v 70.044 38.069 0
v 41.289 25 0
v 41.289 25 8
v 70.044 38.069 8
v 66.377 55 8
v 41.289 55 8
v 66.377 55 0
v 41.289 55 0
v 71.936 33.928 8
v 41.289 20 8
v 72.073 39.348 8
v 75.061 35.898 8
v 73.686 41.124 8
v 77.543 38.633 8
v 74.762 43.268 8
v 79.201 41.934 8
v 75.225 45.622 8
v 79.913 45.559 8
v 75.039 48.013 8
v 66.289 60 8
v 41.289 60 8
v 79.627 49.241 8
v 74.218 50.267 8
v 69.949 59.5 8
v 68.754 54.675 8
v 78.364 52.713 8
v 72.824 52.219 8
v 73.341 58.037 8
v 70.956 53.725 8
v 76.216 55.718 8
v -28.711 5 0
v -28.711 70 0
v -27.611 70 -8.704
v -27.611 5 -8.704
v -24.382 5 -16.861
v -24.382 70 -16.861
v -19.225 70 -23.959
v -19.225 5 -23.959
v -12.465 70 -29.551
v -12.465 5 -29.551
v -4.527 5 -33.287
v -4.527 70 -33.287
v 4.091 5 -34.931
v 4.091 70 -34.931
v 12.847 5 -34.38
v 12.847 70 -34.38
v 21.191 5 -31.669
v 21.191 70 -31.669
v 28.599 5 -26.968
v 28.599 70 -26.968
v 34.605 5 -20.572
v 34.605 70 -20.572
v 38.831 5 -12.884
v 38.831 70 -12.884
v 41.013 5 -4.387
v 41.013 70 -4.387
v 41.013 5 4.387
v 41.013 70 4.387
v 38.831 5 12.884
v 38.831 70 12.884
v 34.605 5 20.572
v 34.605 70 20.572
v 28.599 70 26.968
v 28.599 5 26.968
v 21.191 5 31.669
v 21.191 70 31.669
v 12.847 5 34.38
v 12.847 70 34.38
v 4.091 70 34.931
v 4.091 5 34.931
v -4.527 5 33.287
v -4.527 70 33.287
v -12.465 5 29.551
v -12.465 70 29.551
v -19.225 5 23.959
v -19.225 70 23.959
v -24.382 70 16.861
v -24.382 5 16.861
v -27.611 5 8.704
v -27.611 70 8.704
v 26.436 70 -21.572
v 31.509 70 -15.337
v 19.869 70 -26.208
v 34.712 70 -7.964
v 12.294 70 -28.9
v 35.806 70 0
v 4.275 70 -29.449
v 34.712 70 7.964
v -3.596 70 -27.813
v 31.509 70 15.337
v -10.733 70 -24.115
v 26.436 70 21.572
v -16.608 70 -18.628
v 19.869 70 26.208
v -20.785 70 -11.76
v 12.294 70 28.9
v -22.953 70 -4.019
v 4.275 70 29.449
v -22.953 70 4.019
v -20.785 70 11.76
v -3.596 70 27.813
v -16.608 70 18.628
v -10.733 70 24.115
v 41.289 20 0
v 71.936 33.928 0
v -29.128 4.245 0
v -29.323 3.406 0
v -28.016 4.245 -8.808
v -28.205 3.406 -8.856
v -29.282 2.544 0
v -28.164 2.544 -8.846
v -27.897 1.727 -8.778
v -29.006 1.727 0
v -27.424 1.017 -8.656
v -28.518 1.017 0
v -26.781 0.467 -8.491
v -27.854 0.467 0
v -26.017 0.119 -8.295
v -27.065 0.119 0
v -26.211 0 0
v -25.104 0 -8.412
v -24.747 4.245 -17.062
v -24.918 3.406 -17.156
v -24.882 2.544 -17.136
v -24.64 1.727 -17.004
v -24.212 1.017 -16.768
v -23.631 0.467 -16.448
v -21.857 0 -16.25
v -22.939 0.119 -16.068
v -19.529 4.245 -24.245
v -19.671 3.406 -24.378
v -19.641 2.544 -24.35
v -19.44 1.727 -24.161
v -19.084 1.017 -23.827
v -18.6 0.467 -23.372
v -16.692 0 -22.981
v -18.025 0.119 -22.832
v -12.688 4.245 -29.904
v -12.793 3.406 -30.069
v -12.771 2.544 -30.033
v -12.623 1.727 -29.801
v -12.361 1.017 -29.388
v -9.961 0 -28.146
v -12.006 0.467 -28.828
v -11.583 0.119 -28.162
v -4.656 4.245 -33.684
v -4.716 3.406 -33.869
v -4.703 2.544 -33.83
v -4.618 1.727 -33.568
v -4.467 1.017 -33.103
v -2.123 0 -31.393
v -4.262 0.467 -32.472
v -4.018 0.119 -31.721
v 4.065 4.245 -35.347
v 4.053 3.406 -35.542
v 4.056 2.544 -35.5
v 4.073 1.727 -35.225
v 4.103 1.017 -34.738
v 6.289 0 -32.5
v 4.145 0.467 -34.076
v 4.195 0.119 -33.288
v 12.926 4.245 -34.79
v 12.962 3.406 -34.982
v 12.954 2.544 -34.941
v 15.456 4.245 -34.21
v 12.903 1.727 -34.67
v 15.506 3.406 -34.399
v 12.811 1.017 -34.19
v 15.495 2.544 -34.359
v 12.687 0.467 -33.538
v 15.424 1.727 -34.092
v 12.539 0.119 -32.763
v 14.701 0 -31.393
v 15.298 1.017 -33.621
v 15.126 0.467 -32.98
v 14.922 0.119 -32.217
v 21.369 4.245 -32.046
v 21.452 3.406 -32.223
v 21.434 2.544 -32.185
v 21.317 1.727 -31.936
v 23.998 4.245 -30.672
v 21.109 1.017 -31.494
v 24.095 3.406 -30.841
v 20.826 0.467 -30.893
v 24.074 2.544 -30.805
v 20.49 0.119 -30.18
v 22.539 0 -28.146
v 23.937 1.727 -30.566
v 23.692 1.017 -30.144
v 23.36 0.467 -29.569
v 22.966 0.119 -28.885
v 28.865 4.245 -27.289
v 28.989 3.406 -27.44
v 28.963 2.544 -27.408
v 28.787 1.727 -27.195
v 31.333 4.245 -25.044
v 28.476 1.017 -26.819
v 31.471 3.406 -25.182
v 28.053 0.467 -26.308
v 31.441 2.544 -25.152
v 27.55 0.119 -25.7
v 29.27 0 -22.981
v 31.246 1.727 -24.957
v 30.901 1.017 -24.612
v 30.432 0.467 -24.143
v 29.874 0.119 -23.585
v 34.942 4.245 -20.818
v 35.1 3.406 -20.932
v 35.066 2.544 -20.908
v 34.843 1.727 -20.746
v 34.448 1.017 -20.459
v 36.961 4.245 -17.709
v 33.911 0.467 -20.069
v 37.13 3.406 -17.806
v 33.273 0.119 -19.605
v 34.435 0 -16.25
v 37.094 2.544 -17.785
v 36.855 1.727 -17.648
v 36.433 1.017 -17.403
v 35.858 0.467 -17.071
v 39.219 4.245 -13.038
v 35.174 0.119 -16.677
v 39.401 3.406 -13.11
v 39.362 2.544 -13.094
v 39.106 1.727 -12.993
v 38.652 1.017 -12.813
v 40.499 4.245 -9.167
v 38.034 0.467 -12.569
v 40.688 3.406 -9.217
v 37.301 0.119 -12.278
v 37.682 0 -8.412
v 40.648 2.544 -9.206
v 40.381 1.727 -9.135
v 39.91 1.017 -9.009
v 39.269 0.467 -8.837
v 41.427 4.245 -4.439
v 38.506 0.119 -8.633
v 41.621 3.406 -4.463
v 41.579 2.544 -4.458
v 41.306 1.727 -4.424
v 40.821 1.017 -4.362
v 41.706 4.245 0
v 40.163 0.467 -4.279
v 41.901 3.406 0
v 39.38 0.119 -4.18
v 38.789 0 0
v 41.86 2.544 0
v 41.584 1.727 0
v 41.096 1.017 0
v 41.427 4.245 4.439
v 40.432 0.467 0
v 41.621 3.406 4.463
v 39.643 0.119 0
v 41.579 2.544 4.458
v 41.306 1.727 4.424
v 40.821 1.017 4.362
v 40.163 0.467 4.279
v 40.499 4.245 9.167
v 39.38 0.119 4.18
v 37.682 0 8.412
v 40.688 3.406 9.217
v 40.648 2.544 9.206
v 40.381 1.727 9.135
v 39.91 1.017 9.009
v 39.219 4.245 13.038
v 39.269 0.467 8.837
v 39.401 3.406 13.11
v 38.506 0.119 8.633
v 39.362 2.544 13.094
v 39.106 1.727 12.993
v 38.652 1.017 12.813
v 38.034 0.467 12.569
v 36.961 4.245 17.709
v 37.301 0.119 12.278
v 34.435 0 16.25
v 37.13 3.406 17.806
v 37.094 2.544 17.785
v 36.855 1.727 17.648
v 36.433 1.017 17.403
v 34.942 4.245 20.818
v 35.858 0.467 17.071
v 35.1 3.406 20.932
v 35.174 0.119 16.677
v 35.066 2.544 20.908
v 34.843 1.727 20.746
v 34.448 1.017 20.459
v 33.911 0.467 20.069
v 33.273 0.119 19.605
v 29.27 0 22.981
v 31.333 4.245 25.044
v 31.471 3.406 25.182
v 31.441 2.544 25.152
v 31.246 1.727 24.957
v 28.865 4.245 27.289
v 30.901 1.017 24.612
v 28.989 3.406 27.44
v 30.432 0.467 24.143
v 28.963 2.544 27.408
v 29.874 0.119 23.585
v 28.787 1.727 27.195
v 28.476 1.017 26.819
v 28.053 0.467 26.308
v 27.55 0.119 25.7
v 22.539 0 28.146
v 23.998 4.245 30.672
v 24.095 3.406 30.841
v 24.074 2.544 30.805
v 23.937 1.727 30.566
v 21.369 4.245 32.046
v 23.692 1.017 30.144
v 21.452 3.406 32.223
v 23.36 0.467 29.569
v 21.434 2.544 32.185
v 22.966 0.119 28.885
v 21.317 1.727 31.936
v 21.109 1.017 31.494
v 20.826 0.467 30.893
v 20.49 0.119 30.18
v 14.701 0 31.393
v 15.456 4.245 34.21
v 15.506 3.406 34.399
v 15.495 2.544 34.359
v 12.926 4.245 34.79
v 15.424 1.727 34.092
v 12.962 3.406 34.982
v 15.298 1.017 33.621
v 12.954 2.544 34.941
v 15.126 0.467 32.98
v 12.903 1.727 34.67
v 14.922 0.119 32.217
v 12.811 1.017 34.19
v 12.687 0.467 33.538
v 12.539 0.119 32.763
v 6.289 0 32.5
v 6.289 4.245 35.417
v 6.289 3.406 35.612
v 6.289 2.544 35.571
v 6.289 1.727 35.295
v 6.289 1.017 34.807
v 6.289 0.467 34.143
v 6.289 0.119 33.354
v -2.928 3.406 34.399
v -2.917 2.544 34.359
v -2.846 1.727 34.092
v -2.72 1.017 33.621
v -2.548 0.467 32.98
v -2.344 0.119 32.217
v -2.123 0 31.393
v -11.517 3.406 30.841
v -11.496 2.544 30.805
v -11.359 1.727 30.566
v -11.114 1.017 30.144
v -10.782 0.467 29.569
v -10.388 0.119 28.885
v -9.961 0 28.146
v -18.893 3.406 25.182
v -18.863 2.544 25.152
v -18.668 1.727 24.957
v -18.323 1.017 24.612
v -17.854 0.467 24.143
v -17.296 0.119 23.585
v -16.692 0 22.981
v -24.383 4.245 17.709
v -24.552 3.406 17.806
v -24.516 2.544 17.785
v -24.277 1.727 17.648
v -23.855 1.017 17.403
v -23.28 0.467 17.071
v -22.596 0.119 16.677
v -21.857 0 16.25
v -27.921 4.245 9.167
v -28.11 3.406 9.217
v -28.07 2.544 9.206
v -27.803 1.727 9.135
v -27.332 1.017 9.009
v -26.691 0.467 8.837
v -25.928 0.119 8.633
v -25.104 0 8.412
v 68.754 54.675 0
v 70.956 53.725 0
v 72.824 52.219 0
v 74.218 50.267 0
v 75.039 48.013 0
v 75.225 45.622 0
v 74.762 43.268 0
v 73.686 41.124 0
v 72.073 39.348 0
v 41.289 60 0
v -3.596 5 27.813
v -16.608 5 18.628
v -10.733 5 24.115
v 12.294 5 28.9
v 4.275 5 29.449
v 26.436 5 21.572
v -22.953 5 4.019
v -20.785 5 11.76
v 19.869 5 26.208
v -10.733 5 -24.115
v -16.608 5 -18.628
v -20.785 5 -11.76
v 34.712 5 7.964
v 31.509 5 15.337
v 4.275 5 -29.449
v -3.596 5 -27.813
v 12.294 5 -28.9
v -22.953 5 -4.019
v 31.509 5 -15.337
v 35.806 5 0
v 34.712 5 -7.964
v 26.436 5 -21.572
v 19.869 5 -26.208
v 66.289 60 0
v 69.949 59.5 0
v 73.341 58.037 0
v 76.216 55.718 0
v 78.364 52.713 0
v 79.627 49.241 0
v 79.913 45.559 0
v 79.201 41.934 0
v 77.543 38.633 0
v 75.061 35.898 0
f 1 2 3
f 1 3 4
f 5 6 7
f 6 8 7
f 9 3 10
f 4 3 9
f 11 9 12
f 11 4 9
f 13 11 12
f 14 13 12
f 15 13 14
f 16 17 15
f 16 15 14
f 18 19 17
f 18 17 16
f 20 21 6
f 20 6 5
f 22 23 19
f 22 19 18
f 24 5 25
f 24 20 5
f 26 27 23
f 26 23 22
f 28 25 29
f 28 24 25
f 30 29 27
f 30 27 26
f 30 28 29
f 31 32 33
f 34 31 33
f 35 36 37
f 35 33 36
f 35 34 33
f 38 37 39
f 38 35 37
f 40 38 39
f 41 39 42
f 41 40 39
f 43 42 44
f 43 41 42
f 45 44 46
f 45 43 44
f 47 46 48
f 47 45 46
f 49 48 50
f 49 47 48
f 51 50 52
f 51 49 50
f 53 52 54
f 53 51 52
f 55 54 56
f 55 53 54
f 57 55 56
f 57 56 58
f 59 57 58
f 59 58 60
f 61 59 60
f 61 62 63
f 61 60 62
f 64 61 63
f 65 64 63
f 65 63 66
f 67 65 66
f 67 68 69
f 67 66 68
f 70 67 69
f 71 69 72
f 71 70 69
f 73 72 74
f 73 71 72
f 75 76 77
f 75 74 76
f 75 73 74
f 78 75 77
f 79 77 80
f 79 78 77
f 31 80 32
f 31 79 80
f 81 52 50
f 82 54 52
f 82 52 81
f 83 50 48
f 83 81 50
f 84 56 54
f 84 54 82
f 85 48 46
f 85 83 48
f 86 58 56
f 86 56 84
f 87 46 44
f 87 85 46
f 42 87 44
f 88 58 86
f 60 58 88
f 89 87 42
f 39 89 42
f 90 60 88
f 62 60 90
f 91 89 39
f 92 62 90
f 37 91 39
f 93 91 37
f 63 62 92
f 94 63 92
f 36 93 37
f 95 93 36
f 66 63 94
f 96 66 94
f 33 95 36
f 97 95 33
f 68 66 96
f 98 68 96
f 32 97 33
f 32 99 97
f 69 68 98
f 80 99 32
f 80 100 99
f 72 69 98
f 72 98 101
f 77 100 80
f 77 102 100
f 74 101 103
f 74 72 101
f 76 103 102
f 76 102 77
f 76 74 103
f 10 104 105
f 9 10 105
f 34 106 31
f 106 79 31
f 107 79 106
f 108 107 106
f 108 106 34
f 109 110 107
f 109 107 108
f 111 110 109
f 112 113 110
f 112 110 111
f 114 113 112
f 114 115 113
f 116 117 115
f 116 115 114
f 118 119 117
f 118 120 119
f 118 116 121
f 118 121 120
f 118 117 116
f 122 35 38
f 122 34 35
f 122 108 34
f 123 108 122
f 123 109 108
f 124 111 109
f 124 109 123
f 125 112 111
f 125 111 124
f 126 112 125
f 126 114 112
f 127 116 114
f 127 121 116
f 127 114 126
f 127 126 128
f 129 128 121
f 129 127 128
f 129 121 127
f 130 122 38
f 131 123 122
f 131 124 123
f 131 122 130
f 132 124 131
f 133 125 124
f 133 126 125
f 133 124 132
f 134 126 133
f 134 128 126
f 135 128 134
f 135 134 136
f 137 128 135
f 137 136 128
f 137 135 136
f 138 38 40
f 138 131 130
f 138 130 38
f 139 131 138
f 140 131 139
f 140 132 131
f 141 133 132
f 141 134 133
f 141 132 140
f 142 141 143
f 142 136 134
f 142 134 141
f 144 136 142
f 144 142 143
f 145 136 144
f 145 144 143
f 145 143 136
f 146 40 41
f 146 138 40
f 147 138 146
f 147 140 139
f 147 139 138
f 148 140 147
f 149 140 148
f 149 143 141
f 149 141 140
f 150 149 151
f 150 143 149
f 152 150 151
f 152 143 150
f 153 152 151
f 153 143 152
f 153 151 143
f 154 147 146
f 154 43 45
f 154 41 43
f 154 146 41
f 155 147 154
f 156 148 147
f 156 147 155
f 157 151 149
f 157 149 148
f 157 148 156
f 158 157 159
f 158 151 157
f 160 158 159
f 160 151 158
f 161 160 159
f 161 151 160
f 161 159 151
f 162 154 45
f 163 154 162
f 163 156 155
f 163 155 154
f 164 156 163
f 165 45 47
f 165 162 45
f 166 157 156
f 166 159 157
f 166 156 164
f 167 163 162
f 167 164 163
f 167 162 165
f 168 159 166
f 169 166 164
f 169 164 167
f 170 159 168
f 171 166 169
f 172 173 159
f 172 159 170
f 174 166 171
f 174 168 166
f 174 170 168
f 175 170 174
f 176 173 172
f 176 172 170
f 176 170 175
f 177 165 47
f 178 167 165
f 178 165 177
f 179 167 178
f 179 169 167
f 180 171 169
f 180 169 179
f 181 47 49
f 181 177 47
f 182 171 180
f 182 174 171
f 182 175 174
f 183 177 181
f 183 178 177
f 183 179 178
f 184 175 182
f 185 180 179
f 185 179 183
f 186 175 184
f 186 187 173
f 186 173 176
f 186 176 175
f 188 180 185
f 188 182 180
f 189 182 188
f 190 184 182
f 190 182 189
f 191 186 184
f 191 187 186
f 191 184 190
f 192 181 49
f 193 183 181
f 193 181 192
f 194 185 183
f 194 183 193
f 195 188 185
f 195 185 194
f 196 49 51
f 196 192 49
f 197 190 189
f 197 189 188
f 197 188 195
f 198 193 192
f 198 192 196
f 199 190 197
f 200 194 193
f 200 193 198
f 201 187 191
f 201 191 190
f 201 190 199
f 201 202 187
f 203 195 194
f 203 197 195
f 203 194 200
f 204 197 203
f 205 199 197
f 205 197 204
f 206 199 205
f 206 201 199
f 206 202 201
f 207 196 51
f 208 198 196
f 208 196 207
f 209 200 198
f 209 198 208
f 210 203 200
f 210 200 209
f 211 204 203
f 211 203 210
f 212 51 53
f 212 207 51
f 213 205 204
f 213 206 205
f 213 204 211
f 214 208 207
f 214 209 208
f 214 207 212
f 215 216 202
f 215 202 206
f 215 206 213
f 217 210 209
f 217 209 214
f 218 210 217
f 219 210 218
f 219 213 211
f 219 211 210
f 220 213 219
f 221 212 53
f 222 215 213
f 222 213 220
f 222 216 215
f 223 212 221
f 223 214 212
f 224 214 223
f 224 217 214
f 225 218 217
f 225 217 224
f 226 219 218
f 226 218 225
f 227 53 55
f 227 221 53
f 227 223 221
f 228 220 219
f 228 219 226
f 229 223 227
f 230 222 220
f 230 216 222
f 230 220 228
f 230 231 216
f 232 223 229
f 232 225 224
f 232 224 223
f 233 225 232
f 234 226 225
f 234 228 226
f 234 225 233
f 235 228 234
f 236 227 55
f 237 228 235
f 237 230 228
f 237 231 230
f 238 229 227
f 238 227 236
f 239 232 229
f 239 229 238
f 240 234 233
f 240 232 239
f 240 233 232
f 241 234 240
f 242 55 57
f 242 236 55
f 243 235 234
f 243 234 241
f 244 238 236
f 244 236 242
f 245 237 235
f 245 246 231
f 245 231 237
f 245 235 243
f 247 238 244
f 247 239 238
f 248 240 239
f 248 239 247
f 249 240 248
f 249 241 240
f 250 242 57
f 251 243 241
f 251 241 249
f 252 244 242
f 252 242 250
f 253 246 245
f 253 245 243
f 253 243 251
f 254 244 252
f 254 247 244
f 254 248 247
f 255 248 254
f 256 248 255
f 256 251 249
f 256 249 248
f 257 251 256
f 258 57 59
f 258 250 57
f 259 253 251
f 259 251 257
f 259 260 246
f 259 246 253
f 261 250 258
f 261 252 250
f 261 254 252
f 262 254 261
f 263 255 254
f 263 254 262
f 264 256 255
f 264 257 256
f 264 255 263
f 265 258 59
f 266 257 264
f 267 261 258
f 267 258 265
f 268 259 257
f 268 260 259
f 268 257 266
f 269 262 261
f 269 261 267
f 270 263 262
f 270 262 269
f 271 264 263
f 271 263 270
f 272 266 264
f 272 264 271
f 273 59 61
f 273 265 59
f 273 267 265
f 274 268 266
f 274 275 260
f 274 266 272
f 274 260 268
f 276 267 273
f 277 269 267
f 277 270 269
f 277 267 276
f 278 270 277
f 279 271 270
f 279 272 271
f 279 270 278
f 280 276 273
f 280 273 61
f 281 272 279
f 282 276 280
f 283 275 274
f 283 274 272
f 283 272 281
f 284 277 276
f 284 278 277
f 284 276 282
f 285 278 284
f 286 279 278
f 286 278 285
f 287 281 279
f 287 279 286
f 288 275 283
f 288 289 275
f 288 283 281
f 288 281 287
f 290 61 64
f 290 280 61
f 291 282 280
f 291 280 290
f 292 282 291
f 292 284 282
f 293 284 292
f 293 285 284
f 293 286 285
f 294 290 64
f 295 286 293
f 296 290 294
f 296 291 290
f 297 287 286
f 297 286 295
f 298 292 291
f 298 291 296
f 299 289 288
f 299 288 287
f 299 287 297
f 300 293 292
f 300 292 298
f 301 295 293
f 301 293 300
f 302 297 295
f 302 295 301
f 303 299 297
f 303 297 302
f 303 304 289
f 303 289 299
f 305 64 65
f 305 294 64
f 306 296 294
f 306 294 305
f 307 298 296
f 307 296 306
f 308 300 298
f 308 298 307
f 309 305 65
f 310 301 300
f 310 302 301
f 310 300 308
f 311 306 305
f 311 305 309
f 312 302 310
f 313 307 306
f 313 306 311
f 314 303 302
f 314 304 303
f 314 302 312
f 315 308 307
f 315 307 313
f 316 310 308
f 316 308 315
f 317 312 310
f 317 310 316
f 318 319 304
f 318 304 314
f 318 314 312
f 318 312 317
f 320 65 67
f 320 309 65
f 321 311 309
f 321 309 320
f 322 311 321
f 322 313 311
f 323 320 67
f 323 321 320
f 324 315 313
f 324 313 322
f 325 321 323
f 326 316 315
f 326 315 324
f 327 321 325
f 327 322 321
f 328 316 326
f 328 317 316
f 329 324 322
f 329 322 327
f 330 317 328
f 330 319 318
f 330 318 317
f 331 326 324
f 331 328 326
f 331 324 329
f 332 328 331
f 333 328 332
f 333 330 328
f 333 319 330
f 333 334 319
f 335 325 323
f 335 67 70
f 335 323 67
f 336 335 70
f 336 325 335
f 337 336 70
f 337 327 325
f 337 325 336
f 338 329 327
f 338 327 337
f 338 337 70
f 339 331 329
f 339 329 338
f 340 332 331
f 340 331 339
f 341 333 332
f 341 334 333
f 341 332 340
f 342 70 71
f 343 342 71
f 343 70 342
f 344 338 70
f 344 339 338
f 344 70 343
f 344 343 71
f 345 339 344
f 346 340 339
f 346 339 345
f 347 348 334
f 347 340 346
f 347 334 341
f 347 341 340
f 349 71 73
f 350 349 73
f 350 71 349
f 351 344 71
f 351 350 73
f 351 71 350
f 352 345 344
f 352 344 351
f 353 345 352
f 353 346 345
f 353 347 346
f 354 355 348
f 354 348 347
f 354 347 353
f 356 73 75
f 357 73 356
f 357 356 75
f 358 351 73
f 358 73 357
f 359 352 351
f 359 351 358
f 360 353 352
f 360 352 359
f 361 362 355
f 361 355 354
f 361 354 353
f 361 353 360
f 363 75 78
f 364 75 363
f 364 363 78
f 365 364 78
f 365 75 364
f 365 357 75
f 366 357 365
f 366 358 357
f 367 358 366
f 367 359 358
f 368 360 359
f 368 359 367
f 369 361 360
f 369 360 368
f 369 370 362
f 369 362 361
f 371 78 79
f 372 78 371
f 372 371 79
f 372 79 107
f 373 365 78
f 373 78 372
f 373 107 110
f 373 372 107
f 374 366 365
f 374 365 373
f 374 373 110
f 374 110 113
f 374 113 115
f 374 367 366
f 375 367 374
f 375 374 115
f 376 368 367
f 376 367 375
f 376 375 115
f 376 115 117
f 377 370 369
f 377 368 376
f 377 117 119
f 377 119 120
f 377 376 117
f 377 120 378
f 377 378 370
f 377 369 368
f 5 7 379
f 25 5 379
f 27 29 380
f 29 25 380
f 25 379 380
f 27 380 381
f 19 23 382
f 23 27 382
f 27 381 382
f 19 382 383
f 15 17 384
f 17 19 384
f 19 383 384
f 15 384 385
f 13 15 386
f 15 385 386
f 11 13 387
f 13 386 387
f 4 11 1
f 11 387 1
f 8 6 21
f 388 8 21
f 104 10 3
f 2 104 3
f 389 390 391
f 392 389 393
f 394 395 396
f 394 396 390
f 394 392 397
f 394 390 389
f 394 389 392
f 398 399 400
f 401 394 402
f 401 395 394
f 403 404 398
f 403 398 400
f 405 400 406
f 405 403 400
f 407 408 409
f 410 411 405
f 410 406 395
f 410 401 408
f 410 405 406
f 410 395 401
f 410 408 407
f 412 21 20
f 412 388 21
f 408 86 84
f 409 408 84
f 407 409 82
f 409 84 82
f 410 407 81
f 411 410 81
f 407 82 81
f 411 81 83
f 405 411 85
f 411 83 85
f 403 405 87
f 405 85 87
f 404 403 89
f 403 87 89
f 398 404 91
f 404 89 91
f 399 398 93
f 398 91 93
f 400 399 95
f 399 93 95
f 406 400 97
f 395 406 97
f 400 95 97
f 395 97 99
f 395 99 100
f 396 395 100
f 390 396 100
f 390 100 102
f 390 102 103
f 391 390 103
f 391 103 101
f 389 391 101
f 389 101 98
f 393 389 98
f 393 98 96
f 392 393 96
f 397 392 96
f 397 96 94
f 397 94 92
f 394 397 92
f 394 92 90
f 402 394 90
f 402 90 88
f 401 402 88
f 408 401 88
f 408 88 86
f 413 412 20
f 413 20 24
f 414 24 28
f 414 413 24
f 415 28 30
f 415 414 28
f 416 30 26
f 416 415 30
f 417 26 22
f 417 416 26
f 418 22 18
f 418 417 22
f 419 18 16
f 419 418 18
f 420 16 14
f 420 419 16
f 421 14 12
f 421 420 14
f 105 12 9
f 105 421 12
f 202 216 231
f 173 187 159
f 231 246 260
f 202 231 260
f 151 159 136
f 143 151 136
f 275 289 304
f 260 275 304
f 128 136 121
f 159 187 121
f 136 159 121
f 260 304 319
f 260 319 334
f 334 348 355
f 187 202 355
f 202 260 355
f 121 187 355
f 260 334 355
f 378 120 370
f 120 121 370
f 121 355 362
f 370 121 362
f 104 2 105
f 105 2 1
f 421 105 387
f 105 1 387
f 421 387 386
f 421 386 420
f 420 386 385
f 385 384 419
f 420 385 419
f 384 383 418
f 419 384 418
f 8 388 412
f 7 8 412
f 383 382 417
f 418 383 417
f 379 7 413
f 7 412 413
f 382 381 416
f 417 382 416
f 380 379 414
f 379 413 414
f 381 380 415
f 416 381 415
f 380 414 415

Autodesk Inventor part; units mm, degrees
ref_plane "YZ Plane" through (0, 0, 0) normal (1, 0, 0) x (0, 1, 0)
ref_plane "XZ Plane" through (0, 0, 0) normal (0, 1, 0) x (-1, 0, 0)
ref_plane "XY Plane" through (0, 0, 0) normal (0, 0, 1) x (1, 0, 0)
sketch "Boceto1" plane through (0, 0, 0) normal (0, 0, 1) x (1, 0, 0)
  line L0 (-26.211, 0) -> (6.289, 0)
  line L1 (6.289, 0) -> (6.289, 70)
  line L2 (6.289, 70) -> (-28.711, 70)
  line L3 (-28.711, 70) -> (-28.711, 5)
  arc A0 (-28.711, 5) -> (-26.211, 0) centre (-26.211, 3.125) ccw
  point P0 (0, 0)
  dimension "d2" = 32.5
  dimension "d3" = 70
  dimension "d4" = 35
  dimension "d5" = 65
revolve "Revolución1" add sketch "Boceto1" angle 360 about axis through (6.289, 0, 0) along (0, 1, 0)
sketch "Boceto2" plane through (6.289, 70, 0) normal (0, 1, 0) x (1, 0, 0)
  circle A0 centre (0, 0) radius 29.5174
  point P0 (-6.289, 0)
extrude "Extrusión1" cut sketch "Boceto2" against normal blind 65
sketch "Boceto3" plane through (0, 0, 0) normal (0, 0, 1) x (1, 0, 0)
  line L0 (41.289, 70) -> (-28.711, 70) projected
  line L1 (41.289, 70) -> (41.289, 60)
  line L2 (41.289, 5) -> (41.289, 70) projected
  line L3 (41.289, 60) -> (66.289, 60)
  line L4 (41.289, 5) -> (41.289, 20)
  line L5 (41.289, 20) -> (71.9356, 33.9284)
  arc A0 (71.9356, 33.9284) -> (66.289, 60) centre (66.289, 46.3527) ccw
  line L6 (41.289, 60) -> (41.289, 55)
  line L7 (41.289, 55) -> (66.3769, 55)
  line L8 (41.289, 20) -> (41.289, 25)
  line L9 (41.289, 25) -> (70.0439, 38.0686)
  arc A1 (70.0439, 38.0686) -> (66.3769, 55) centre (66.3769, 46.1372) ccw
  point P0 (0, 0)
  dimension "d9" = 10
  dimension "d10" = 25
  dimension "d11" = 15
  dimension "d12" = 5
  dimension "d13" = 5
extrude "Extrusión2" add sketch "Boceto3" along normal blind 8 contours L2 L9 A1 L7 L3 A0 L5
properties part number "TAZA DEL CID"
